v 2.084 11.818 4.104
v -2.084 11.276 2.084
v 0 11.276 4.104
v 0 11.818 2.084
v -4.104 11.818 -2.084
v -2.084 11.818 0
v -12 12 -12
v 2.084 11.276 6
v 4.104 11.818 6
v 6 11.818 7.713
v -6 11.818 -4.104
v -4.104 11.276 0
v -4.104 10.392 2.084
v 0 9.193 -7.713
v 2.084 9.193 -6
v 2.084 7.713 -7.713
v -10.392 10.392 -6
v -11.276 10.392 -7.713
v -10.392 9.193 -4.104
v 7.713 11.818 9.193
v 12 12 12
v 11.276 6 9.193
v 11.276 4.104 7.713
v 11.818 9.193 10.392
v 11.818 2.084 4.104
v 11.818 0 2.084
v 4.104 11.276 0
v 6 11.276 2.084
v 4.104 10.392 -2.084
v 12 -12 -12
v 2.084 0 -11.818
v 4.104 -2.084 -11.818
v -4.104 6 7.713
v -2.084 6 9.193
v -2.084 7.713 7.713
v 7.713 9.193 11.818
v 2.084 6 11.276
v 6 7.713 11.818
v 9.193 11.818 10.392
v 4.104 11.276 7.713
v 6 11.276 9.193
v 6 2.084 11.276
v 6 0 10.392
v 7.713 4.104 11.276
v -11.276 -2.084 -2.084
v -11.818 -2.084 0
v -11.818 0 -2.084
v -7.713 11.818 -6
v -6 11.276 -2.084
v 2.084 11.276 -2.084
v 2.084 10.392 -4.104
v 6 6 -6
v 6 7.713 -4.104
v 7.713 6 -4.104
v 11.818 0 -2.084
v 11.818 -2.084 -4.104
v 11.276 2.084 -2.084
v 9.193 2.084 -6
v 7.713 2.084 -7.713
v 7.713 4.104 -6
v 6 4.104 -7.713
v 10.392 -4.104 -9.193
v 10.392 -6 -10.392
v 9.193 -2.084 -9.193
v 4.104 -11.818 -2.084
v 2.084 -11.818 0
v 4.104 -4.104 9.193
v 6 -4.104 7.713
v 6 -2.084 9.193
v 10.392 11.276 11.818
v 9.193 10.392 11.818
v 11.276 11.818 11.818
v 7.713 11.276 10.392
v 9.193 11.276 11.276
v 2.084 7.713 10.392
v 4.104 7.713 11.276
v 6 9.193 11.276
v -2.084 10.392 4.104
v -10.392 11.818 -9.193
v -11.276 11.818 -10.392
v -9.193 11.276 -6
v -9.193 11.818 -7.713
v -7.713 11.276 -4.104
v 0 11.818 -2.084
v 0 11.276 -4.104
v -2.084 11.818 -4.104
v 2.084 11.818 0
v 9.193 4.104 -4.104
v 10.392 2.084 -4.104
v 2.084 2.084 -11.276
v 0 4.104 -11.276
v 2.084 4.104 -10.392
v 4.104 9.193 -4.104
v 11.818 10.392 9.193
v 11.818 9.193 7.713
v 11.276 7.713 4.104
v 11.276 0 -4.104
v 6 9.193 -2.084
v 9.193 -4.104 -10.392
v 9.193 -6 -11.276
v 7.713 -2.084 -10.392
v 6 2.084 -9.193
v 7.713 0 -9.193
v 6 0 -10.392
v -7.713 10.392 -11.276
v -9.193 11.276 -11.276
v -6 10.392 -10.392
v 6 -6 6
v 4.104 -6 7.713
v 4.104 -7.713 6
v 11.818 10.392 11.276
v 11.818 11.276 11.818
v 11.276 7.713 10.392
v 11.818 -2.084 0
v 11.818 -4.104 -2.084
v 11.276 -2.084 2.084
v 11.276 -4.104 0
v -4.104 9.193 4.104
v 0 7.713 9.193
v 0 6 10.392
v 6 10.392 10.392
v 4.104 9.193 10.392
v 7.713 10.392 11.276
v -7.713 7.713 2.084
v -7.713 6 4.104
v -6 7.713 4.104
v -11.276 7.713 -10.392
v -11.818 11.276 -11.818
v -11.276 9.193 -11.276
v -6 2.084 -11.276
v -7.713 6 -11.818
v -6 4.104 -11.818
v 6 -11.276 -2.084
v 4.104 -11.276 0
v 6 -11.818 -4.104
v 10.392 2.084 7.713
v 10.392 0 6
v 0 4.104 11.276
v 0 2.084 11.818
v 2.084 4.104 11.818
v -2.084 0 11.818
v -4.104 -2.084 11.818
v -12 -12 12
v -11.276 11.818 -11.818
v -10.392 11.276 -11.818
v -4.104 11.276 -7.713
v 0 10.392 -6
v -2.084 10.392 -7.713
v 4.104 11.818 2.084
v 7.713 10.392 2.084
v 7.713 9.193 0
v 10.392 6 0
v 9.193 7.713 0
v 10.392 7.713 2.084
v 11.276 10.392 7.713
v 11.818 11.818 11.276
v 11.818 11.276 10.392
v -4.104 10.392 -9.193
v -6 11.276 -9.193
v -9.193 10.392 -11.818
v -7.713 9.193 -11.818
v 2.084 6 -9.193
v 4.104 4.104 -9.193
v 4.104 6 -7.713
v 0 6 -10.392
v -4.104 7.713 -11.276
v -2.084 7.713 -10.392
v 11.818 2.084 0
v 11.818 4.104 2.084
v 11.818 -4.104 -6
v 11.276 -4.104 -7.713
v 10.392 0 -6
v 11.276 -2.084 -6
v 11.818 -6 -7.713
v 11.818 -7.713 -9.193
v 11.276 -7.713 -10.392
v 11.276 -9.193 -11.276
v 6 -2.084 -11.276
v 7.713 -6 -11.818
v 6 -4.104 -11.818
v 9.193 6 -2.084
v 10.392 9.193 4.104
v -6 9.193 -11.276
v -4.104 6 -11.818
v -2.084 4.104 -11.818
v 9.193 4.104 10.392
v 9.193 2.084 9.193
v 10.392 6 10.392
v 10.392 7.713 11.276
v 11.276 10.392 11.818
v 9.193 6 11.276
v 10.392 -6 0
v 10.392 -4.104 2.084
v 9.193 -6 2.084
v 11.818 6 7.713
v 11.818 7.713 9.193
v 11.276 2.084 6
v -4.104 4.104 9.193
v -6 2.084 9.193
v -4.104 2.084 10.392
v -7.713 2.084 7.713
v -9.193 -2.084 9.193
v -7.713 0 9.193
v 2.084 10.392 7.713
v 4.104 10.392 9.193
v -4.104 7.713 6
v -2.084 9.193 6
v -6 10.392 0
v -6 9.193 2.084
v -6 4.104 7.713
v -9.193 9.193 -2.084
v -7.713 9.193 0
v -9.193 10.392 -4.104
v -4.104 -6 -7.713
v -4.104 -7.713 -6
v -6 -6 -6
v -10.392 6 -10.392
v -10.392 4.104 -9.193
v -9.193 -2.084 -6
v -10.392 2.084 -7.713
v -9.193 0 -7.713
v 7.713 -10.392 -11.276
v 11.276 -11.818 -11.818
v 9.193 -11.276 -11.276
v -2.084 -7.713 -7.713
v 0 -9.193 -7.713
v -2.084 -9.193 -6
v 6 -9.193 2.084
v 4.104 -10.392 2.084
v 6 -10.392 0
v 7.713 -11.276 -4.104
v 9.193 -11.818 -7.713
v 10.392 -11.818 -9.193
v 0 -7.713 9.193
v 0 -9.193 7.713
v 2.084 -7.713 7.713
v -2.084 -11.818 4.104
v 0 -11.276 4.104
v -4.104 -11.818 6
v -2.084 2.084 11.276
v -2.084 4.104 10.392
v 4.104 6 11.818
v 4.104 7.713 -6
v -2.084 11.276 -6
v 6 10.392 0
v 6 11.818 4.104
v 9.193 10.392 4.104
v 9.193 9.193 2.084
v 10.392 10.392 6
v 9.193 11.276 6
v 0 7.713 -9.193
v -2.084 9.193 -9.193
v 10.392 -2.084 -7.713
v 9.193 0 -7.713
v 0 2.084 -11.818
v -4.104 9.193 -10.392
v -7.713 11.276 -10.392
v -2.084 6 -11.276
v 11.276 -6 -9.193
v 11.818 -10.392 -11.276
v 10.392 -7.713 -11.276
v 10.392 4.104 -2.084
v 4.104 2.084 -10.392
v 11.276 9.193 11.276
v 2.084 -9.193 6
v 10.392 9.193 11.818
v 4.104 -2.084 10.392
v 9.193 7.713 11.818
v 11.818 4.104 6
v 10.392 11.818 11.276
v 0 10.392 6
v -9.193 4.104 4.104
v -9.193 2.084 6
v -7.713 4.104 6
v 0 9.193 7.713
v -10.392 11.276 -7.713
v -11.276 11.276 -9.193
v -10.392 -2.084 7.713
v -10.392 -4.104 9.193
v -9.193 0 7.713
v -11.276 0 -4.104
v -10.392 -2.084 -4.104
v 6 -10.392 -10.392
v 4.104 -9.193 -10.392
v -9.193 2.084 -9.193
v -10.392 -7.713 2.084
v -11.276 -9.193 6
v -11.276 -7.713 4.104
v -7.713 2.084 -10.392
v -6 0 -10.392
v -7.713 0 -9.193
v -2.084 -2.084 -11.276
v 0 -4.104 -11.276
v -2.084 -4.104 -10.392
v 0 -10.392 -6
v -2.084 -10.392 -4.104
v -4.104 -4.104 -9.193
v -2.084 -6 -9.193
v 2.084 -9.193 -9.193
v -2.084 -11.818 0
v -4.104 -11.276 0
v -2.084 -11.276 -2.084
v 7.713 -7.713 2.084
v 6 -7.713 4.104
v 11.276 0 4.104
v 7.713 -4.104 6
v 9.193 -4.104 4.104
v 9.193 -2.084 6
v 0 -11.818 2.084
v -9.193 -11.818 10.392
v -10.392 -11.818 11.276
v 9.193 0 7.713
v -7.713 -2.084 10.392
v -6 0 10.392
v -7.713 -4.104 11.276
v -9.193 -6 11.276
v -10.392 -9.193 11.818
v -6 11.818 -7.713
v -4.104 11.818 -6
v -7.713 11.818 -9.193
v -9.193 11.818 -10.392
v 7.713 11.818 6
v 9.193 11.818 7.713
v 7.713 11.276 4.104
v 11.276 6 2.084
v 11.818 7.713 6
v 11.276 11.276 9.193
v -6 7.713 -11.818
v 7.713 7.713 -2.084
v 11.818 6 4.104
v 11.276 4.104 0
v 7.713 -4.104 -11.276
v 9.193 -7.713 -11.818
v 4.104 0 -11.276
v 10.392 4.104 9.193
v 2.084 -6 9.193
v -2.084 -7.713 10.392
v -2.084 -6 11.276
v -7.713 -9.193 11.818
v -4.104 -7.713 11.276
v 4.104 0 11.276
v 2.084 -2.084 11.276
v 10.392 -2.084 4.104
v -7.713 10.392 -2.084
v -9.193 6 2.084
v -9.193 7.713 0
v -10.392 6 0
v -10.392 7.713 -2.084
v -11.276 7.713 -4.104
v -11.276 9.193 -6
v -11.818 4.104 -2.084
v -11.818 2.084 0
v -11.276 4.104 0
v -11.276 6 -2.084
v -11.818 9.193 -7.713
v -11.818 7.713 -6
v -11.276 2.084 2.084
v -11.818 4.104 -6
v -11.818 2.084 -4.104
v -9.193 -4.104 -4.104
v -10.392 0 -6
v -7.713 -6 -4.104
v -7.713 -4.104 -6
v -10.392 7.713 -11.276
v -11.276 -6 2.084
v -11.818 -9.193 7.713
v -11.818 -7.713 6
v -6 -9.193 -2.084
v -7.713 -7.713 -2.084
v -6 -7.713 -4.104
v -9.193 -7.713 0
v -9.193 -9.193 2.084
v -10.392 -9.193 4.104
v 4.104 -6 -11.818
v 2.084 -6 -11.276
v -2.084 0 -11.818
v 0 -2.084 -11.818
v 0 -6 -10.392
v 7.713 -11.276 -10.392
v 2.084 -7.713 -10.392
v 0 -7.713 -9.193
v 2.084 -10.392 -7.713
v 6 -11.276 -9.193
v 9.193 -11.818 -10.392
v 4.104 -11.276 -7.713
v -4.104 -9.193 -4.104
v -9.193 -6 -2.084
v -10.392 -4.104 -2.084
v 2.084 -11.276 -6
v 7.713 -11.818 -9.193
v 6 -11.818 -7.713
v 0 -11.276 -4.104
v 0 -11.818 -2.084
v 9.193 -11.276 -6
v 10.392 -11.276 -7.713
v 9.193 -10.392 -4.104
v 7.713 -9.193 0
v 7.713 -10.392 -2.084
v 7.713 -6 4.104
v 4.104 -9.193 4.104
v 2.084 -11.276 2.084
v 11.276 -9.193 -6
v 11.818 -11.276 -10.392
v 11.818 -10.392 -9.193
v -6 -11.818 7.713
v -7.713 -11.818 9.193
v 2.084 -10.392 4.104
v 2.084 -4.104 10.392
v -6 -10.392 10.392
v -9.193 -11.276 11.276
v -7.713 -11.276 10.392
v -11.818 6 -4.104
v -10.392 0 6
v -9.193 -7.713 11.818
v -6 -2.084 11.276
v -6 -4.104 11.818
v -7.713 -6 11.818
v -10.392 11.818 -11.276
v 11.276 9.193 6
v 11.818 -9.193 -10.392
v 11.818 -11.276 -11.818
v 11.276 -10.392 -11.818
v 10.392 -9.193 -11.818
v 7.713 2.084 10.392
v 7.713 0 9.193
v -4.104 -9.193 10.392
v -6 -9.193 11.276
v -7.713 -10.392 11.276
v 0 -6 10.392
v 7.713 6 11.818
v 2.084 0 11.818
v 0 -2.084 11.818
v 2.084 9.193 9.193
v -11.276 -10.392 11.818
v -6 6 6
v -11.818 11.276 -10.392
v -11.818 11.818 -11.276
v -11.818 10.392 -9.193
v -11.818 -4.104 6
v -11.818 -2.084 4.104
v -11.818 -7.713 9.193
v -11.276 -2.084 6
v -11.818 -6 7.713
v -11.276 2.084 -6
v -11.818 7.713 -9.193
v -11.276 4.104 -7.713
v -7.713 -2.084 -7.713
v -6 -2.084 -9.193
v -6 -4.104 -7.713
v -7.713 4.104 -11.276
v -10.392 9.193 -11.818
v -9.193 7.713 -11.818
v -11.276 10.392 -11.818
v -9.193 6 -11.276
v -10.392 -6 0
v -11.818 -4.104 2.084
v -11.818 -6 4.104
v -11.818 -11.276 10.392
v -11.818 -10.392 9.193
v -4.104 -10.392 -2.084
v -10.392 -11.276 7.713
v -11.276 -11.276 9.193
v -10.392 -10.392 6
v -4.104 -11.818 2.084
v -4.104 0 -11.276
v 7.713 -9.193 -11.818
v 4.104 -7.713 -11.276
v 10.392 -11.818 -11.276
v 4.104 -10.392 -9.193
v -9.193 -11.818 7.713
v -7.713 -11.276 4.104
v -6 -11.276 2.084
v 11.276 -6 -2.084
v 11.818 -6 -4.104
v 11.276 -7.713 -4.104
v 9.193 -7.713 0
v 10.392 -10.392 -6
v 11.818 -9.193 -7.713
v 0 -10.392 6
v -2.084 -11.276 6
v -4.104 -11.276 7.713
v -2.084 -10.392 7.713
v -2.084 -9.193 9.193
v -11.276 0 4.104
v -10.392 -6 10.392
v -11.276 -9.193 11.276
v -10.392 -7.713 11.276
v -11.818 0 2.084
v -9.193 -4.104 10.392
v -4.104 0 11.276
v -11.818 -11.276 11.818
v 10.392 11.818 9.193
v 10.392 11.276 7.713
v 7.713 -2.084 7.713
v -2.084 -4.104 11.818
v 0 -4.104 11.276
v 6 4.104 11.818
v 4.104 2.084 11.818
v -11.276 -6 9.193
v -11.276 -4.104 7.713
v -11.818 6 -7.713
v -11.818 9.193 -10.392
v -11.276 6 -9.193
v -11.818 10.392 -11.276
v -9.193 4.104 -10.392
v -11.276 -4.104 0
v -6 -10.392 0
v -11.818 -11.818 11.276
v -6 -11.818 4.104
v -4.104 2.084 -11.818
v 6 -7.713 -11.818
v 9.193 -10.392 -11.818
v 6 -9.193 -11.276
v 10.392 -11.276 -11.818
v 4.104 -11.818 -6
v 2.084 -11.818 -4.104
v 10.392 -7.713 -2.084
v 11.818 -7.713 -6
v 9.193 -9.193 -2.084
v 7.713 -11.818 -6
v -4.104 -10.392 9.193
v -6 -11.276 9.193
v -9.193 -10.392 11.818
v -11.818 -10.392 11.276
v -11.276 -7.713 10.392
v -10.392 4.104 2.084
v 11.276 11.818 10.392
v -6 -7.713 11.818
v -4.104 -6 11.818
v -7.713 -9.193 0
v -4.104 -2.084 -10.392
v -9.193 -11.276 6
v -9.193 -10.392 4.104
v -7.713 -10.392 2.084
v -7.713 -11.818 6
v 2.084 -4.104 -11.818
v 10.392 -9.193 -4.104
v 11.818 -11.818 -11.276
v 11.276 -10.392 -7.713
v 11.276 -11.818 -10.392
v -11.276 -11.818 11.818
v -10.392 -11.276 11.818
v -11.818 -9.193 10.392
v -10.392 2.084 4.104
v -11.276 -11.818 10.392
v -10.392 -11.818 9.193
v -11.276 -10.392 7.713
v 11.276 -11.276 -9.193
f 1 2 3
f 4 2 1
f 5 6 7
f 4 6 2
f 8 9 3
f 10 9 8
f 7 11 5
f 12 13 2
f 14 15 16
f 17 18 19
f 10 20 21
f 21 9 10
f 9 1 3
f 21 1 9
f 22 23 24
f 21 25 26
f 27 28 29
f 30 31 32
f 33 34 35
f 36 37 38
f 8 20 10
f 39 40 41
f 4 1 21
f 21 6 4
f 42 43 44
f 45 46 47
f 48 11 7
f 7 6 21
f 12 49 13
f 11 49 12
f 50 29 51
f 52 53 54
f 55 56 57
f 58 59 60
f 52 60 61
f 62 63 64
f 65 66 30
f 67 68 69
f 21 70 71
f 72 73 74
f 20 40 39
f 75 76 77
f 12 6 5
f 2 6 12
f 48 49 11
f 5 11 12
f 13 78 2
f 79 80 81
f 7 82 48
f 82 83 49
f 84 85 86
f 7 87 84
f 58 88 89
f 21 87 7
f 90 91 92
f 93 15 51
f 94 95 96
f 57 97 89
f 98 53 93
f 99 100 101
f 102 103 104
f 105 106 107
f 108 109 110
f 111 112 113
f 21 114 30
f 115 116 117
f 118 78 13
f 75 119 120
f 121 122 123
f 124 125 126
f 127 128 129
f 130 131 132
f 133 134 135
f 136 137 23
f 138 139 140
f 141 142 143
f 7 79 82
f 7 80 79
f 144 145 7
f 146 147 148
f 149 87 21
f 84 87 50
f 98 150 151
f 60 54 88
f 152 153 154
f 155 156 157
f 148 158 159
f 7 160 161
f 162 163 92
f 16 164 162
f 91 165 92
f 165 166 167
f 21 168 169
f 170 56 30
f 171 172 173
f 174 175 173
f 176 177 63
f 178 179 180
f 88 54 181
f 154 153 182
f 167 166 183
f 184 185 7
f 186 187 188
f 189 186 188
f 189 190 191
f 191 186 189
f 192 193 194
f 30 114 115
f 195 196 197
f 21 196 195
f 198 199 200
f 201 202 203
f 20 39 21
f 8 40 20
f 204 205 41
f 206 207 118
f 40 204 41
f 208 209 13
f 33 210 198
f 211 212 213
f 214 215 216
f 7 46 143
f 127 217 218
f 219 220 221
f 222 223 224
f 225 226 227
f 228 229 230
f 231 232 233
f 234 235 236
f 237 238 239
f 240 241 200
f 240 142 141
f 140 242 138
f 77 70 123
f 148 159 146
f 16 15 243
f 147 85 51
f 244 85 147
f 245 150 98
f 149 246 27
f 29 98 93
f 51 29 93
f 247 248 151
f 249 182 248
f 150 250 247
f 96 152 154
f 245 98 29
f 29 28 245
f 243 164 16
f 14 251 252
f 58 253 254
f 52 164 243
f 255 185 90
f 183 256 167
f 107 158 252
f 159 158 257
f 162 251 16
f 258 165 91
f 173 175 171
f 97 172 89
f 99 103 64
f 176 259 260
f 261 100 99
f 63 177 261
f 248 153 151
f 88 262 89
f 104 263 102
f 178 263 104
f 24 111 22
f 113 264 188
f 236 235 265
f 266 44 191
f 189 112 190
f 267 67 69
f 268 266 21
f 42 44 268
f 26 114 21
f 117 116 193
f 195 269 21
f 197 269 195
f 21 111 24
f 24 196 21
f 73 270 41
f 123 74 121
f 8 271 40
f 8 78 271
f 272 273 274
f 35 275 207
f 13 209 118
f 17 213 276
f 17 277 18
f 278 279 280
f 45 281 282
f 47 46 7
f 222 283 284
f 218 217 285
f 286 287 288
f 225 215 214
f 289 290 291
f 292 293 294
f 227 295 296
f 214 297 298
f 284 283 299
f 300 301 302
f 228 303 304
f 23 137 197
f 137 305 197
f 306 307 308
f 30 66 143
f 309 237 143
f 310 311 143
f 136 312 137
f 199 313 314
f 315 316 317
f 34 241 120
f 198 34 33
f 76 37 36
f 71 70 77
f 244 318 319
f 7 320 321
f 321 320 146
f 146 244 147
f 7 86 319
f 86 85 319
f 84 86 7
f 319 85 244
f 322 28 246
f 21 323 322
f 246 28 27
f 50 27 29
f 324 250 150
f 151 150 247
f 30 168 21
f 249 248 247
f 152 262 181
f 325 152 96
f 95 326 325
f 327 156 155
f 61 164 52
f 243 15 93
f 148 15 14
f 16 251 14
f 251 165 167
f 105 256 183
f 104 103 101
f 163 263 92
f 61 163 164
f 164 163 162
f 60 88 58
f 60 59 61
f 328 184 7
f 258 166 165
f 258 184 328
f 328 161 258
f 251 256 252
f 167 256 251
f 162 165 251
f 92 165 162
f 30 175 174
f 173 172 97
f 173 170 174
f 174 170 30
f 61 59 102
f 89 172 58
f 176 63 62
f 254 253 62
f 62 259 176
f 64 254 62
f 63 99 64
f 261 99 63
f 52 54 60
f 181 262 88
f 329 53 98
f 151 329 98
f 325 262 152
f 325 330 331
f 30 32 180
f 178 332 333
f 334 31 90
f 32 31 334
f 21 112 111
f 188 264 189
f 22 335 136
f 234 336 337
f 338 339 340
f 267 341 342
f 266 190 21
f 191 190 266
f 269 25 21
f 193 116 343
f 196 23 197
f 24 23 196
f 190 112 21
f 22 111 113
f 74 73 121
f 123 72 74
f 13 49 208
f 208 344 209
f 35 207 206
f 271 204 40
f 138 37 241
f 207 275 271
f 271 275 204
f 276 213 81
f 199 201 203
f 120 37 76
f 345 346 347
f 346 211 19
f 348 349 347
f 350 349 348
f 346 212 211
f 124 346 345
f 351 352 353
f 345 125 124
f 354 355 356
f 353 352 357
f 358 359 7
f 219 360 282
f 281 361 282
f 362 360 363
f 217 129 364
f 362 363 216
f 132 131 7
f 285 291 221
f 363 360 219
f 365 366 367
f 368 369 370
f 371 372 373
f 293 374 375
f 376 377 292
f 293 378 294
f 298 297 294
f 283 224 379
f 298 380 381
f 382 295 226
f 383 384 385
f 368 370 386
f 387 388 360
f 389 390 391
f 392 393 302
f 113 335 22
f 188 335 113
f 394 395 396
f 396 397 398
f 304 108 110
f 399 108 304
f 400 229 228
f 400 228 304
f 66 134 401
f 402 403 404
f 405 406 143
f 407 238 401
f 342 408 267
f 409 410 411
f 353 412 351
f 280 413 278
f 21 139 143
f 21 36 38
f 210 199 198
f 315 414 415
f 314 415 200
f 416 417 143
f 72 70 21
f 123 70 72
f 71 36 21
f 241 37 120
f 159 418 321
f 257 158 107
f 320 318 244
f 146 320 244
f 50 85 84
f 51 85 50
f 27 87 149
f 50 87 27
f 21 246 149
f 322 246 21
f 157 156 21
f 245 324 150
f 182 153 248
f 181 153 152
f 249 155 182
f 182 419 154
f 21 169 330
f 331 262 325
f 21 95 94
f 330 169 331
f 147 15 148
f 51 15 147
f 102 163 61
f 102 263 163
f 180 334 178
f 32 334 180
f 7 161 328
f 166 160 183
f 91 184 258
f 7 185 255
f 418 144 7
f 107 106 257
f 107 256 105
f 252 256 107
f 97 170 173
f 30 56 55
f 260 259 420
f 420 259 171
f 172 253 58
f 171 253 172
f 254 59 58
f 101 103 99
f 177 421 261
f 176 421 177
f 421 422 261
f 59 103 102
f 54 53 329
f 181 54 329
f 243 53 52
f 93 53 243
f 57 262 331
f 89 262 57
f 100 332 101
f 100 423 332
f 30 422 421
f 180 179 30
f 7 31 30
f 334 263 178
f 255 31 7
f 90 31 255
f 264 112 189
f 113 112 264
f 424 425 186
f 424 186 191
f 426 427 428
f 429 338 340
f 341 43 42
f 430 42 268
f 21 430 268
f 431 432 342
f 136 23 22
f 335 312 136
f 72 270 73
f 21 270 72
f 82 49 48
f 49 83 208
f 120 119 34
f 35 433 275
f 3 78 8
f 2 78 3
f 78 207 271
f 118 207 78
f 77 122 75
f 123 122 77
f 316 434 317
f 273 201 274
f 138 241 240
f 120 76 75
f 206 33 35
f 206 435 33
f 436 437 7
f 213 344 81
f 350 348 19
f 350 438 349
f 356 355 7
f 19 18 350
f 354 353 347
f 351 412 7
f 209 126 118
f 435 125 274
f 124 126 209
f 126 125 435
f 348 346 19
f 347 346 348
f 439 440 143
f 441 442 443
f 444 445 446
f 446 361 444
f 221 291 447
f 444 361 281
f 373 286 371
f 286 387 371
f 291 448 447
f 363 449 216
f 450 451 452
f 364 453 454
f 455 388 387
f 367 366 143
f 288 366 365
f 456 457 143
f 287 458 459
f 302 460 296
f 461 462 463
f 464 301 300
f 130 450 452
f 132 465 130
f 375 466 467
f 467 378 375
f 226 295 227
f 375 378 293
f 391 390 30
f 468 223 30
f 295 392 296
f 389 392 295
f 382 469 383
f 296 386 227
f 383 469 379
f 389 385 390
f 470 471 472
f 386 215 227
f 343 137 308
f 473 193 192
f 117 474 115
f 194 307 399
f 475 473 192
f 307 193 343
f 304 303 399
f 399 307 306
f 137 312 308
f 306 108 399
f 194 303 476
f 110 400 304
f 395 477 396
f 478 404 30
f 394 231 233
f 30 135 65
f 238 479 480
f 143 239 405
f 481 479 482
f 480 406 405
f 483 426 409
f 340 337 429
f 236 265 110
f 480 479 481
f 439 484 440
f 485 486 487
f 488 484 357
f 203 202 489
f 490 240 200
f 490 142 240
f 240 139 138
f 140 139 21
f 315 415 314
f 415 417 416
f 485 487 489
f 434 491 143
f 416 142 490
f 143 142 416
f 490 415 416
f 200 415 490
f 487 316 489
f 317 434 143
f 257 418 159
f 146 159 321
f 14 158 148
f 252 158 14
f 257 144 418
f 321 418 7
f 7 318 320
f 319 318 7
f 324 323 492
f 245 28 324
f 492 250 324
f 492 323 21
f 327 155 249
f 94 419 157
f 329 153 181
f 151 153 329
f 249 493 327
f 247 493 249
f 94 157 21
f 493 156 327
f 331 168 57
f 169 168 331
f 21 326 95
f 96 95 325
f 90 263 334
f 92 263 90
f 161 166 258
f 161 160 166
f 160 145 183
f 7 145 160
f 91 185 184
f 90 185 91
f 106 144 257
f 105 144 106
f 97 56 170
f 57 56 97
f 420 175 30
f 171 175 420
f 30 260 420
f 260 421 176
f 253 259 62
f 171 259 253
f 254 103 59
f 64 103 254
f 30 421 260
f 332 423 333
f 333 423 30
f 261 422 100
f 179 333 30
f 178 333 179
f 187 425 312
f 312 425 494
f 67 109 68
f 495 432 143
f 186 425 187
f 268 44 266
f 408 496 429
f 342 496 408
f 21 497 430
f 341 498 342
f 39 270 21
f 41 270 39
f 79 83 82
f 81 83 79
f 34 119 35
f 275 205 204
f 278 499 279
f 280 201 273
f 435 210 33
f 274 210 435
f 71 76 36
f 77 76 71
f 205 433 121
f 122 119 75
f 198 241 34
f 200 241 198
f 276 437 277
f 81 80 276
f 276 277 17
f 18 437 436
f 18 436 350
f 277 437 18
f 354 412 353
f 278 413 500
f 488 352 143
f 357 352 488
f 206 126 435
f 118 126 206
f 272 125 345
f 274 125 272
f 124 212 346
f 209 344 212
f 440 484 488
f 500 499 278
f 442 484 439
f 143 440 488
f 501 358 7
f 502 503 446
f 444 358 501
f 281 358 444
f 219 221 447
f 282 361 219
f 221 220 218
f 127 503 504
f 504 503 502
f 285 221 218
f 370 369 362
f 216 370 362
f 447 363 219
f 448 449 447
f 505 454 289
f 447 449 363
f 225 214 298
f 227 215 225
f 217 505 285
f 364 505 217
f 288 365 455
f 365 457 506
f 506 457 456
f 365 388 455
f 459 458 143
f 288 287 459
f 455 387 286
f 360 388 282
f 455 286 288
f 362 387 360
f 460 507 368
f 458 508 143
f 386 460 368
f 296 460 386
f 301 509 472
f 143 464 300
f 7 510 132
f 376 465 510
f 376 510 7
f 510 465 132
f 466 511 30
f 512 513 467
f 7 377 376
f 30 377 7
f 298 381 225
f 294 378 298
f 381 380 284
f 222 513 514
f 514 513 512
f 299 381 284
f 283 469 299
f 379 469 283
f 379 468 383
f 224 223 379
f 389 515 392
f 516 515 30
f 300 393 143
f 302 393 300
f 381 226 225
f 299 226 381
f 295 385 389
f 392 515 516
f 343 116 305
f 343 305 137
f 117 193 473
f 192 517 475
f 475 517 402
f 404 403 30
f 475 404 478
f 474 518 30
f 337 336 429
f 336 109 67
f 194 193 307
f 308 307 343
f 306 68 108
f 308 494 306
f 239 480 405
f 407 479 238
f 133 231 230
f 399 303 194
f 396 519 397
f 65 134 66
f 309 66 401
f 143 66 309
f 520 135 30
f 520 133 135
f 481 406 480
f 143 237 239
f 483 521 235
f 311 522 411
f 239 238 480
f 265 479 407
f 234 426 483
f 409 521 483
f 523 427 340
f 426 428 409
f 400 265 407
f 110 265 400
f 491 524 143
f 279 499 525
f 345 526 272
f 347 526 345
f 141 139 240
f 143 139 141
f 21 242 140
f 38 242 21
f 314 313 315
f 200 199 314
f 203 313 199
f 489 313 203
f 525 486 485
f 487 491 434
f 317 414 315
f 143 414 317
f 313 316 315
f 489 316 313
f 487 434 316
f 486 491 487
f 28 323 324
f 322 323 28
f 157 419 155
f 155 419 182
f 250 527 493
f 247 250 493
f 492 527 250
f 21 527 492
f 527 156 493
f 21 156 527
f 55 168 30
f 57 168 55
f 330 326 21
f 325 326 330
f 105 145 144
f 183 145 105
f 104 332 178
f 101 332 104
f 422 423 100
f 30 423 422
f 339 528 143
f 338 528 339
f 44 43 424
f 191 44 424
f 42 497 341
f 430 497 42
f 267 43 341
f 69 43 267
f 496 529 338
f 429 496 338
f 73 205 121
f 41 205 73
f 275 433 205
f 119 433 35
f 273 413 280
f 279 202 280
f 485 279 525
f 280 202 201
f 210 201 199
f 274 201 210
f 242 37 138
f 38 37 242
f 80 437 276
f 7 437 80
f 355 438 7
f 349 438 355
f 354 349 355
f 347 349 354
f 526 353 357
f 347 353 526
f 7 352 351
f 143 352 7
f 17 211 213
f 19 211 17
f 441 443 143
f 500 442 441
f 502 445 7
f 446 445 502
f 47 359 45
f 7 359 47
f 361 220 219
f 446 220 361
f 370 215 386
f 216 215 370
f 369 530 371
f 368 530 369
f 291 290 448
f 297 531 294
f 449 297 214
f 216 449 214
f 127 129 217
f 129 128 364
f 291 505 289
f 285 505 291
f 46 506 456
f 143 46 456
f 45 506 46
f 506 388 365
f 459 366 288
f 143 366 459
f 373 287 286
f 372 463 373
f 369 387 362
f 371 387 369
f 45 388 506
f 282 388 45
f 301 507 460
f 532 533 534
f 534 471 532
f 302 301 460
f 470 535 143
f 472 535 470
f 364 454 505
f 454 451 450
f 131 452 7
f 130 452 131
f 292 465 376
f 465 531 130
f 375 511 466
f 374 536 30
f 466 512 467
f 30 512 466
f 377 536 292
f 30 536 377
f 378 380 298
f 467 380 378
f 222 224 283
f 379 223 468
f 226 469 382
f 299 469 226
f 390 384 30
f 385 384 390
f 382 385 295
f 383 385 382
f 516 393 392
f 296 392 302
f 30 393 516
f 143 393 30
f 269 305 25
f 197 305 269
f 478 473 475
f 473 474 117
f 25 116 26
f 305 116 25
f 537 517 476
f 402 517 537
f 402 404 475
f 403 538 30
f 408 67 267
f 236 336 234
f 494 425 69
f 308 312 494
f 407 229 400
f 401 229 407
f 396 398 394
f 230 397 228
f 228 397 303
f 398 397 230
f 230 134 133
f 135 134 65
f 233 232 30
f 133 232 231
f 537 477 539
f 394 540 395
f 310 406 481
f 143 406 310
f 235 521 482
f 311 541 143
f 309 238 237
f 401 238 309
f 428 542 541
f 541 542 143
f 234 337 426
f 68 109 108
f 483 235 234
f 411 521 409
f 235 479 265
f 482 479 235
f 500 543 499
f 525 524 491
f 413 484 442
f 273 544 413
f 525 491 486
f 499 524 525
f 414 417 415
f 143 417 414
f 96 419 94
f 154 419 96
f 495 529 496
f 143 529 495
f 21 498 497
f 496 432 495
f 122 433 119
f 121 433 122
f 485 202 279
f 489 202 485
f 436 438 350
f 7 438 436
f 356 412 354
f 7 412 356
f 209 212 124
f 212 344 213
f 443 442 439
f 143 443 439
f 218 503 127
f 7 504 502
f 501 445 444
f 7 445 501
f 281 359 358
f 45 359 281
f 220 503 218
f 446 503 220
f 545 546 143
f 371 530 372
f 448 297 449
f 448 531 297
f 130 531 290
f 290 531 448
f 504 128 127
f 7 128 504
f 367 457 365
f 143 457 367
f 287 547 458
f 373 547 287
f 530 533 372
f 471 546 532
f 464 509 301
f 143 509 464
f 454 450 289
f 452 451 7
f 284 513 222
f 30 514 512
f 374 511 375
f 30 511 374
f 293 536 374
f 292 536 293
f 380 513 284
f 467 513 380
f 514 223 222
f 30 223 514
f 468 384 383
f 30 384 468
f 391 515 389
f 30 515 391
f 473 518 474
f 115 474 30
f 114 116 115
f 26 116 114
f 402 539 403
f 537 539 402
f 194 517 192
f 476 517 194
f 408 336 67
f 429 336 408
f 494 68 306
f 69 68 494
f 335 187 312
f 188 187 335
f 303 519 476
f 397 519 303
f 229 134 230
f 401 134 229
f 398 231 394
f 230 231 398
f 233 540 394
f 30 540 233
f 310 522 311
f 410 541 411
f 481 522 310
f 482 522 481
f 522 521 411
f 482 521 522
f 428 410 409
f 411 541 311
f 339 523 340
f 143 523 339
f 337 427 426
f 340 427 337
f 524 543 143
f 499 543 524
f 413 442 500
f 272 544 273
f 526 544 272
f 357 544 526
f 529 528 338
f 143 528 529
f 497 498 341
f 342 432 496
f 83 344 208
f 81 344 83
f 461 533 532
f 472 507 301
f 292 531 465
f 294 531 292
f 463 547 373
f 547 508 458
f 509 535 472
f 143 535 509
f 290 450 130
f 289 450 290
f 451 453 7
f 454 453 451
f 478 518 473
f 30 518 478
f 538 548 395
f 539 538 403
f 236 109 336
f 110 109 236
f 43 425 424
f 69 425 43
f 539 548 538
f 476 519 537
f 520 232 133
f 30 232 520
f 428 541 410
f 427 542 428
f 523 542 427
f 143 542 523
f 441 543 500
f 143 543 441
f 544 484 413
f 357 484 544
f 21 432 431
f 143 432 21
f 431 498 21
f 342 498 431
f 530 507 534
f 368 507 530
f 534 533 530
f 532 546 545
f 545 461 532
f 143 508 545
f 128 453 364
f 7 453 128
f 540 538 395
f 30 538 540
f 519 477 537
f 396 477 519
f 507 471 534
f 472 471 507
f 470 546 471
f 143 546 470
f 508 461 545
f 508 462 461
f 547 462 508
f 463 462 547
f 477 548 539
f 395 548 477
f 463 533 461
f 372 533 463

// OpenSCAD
/* scADVENT 2021 -Polyhedron-   by Ulrich Bär  license:CC0 
 https://creativecommons.org/publicdomain/zero/1.0/
 
 
 Today we learn how to model and animate a convex Polyhedron 
 */

/*[Polyhedron]*/
steps=36;
size=12;
rotations=1;


p=[for(i=[0:steps-1],j=[0:steps-1])
  let(x=i*360/steps,y=j*360/steps)
  [sin(x),cos(y),sin((y+x)+180*$t)]];// points changed by animation factor $t
  

color("gold")rotate([90*$t*2,0])rotate(90*$t*rotations)scale(size)AutoPoly(p);



module AutoPoly(p){
f=[for(i=[0:len(p)-3])[i,i+1,i+2]]; // faces are created arbitrary
hull()                              // a hull makes the polyheadron pieces to a solid object
polyhedron(p,f,convexity=5);
}
